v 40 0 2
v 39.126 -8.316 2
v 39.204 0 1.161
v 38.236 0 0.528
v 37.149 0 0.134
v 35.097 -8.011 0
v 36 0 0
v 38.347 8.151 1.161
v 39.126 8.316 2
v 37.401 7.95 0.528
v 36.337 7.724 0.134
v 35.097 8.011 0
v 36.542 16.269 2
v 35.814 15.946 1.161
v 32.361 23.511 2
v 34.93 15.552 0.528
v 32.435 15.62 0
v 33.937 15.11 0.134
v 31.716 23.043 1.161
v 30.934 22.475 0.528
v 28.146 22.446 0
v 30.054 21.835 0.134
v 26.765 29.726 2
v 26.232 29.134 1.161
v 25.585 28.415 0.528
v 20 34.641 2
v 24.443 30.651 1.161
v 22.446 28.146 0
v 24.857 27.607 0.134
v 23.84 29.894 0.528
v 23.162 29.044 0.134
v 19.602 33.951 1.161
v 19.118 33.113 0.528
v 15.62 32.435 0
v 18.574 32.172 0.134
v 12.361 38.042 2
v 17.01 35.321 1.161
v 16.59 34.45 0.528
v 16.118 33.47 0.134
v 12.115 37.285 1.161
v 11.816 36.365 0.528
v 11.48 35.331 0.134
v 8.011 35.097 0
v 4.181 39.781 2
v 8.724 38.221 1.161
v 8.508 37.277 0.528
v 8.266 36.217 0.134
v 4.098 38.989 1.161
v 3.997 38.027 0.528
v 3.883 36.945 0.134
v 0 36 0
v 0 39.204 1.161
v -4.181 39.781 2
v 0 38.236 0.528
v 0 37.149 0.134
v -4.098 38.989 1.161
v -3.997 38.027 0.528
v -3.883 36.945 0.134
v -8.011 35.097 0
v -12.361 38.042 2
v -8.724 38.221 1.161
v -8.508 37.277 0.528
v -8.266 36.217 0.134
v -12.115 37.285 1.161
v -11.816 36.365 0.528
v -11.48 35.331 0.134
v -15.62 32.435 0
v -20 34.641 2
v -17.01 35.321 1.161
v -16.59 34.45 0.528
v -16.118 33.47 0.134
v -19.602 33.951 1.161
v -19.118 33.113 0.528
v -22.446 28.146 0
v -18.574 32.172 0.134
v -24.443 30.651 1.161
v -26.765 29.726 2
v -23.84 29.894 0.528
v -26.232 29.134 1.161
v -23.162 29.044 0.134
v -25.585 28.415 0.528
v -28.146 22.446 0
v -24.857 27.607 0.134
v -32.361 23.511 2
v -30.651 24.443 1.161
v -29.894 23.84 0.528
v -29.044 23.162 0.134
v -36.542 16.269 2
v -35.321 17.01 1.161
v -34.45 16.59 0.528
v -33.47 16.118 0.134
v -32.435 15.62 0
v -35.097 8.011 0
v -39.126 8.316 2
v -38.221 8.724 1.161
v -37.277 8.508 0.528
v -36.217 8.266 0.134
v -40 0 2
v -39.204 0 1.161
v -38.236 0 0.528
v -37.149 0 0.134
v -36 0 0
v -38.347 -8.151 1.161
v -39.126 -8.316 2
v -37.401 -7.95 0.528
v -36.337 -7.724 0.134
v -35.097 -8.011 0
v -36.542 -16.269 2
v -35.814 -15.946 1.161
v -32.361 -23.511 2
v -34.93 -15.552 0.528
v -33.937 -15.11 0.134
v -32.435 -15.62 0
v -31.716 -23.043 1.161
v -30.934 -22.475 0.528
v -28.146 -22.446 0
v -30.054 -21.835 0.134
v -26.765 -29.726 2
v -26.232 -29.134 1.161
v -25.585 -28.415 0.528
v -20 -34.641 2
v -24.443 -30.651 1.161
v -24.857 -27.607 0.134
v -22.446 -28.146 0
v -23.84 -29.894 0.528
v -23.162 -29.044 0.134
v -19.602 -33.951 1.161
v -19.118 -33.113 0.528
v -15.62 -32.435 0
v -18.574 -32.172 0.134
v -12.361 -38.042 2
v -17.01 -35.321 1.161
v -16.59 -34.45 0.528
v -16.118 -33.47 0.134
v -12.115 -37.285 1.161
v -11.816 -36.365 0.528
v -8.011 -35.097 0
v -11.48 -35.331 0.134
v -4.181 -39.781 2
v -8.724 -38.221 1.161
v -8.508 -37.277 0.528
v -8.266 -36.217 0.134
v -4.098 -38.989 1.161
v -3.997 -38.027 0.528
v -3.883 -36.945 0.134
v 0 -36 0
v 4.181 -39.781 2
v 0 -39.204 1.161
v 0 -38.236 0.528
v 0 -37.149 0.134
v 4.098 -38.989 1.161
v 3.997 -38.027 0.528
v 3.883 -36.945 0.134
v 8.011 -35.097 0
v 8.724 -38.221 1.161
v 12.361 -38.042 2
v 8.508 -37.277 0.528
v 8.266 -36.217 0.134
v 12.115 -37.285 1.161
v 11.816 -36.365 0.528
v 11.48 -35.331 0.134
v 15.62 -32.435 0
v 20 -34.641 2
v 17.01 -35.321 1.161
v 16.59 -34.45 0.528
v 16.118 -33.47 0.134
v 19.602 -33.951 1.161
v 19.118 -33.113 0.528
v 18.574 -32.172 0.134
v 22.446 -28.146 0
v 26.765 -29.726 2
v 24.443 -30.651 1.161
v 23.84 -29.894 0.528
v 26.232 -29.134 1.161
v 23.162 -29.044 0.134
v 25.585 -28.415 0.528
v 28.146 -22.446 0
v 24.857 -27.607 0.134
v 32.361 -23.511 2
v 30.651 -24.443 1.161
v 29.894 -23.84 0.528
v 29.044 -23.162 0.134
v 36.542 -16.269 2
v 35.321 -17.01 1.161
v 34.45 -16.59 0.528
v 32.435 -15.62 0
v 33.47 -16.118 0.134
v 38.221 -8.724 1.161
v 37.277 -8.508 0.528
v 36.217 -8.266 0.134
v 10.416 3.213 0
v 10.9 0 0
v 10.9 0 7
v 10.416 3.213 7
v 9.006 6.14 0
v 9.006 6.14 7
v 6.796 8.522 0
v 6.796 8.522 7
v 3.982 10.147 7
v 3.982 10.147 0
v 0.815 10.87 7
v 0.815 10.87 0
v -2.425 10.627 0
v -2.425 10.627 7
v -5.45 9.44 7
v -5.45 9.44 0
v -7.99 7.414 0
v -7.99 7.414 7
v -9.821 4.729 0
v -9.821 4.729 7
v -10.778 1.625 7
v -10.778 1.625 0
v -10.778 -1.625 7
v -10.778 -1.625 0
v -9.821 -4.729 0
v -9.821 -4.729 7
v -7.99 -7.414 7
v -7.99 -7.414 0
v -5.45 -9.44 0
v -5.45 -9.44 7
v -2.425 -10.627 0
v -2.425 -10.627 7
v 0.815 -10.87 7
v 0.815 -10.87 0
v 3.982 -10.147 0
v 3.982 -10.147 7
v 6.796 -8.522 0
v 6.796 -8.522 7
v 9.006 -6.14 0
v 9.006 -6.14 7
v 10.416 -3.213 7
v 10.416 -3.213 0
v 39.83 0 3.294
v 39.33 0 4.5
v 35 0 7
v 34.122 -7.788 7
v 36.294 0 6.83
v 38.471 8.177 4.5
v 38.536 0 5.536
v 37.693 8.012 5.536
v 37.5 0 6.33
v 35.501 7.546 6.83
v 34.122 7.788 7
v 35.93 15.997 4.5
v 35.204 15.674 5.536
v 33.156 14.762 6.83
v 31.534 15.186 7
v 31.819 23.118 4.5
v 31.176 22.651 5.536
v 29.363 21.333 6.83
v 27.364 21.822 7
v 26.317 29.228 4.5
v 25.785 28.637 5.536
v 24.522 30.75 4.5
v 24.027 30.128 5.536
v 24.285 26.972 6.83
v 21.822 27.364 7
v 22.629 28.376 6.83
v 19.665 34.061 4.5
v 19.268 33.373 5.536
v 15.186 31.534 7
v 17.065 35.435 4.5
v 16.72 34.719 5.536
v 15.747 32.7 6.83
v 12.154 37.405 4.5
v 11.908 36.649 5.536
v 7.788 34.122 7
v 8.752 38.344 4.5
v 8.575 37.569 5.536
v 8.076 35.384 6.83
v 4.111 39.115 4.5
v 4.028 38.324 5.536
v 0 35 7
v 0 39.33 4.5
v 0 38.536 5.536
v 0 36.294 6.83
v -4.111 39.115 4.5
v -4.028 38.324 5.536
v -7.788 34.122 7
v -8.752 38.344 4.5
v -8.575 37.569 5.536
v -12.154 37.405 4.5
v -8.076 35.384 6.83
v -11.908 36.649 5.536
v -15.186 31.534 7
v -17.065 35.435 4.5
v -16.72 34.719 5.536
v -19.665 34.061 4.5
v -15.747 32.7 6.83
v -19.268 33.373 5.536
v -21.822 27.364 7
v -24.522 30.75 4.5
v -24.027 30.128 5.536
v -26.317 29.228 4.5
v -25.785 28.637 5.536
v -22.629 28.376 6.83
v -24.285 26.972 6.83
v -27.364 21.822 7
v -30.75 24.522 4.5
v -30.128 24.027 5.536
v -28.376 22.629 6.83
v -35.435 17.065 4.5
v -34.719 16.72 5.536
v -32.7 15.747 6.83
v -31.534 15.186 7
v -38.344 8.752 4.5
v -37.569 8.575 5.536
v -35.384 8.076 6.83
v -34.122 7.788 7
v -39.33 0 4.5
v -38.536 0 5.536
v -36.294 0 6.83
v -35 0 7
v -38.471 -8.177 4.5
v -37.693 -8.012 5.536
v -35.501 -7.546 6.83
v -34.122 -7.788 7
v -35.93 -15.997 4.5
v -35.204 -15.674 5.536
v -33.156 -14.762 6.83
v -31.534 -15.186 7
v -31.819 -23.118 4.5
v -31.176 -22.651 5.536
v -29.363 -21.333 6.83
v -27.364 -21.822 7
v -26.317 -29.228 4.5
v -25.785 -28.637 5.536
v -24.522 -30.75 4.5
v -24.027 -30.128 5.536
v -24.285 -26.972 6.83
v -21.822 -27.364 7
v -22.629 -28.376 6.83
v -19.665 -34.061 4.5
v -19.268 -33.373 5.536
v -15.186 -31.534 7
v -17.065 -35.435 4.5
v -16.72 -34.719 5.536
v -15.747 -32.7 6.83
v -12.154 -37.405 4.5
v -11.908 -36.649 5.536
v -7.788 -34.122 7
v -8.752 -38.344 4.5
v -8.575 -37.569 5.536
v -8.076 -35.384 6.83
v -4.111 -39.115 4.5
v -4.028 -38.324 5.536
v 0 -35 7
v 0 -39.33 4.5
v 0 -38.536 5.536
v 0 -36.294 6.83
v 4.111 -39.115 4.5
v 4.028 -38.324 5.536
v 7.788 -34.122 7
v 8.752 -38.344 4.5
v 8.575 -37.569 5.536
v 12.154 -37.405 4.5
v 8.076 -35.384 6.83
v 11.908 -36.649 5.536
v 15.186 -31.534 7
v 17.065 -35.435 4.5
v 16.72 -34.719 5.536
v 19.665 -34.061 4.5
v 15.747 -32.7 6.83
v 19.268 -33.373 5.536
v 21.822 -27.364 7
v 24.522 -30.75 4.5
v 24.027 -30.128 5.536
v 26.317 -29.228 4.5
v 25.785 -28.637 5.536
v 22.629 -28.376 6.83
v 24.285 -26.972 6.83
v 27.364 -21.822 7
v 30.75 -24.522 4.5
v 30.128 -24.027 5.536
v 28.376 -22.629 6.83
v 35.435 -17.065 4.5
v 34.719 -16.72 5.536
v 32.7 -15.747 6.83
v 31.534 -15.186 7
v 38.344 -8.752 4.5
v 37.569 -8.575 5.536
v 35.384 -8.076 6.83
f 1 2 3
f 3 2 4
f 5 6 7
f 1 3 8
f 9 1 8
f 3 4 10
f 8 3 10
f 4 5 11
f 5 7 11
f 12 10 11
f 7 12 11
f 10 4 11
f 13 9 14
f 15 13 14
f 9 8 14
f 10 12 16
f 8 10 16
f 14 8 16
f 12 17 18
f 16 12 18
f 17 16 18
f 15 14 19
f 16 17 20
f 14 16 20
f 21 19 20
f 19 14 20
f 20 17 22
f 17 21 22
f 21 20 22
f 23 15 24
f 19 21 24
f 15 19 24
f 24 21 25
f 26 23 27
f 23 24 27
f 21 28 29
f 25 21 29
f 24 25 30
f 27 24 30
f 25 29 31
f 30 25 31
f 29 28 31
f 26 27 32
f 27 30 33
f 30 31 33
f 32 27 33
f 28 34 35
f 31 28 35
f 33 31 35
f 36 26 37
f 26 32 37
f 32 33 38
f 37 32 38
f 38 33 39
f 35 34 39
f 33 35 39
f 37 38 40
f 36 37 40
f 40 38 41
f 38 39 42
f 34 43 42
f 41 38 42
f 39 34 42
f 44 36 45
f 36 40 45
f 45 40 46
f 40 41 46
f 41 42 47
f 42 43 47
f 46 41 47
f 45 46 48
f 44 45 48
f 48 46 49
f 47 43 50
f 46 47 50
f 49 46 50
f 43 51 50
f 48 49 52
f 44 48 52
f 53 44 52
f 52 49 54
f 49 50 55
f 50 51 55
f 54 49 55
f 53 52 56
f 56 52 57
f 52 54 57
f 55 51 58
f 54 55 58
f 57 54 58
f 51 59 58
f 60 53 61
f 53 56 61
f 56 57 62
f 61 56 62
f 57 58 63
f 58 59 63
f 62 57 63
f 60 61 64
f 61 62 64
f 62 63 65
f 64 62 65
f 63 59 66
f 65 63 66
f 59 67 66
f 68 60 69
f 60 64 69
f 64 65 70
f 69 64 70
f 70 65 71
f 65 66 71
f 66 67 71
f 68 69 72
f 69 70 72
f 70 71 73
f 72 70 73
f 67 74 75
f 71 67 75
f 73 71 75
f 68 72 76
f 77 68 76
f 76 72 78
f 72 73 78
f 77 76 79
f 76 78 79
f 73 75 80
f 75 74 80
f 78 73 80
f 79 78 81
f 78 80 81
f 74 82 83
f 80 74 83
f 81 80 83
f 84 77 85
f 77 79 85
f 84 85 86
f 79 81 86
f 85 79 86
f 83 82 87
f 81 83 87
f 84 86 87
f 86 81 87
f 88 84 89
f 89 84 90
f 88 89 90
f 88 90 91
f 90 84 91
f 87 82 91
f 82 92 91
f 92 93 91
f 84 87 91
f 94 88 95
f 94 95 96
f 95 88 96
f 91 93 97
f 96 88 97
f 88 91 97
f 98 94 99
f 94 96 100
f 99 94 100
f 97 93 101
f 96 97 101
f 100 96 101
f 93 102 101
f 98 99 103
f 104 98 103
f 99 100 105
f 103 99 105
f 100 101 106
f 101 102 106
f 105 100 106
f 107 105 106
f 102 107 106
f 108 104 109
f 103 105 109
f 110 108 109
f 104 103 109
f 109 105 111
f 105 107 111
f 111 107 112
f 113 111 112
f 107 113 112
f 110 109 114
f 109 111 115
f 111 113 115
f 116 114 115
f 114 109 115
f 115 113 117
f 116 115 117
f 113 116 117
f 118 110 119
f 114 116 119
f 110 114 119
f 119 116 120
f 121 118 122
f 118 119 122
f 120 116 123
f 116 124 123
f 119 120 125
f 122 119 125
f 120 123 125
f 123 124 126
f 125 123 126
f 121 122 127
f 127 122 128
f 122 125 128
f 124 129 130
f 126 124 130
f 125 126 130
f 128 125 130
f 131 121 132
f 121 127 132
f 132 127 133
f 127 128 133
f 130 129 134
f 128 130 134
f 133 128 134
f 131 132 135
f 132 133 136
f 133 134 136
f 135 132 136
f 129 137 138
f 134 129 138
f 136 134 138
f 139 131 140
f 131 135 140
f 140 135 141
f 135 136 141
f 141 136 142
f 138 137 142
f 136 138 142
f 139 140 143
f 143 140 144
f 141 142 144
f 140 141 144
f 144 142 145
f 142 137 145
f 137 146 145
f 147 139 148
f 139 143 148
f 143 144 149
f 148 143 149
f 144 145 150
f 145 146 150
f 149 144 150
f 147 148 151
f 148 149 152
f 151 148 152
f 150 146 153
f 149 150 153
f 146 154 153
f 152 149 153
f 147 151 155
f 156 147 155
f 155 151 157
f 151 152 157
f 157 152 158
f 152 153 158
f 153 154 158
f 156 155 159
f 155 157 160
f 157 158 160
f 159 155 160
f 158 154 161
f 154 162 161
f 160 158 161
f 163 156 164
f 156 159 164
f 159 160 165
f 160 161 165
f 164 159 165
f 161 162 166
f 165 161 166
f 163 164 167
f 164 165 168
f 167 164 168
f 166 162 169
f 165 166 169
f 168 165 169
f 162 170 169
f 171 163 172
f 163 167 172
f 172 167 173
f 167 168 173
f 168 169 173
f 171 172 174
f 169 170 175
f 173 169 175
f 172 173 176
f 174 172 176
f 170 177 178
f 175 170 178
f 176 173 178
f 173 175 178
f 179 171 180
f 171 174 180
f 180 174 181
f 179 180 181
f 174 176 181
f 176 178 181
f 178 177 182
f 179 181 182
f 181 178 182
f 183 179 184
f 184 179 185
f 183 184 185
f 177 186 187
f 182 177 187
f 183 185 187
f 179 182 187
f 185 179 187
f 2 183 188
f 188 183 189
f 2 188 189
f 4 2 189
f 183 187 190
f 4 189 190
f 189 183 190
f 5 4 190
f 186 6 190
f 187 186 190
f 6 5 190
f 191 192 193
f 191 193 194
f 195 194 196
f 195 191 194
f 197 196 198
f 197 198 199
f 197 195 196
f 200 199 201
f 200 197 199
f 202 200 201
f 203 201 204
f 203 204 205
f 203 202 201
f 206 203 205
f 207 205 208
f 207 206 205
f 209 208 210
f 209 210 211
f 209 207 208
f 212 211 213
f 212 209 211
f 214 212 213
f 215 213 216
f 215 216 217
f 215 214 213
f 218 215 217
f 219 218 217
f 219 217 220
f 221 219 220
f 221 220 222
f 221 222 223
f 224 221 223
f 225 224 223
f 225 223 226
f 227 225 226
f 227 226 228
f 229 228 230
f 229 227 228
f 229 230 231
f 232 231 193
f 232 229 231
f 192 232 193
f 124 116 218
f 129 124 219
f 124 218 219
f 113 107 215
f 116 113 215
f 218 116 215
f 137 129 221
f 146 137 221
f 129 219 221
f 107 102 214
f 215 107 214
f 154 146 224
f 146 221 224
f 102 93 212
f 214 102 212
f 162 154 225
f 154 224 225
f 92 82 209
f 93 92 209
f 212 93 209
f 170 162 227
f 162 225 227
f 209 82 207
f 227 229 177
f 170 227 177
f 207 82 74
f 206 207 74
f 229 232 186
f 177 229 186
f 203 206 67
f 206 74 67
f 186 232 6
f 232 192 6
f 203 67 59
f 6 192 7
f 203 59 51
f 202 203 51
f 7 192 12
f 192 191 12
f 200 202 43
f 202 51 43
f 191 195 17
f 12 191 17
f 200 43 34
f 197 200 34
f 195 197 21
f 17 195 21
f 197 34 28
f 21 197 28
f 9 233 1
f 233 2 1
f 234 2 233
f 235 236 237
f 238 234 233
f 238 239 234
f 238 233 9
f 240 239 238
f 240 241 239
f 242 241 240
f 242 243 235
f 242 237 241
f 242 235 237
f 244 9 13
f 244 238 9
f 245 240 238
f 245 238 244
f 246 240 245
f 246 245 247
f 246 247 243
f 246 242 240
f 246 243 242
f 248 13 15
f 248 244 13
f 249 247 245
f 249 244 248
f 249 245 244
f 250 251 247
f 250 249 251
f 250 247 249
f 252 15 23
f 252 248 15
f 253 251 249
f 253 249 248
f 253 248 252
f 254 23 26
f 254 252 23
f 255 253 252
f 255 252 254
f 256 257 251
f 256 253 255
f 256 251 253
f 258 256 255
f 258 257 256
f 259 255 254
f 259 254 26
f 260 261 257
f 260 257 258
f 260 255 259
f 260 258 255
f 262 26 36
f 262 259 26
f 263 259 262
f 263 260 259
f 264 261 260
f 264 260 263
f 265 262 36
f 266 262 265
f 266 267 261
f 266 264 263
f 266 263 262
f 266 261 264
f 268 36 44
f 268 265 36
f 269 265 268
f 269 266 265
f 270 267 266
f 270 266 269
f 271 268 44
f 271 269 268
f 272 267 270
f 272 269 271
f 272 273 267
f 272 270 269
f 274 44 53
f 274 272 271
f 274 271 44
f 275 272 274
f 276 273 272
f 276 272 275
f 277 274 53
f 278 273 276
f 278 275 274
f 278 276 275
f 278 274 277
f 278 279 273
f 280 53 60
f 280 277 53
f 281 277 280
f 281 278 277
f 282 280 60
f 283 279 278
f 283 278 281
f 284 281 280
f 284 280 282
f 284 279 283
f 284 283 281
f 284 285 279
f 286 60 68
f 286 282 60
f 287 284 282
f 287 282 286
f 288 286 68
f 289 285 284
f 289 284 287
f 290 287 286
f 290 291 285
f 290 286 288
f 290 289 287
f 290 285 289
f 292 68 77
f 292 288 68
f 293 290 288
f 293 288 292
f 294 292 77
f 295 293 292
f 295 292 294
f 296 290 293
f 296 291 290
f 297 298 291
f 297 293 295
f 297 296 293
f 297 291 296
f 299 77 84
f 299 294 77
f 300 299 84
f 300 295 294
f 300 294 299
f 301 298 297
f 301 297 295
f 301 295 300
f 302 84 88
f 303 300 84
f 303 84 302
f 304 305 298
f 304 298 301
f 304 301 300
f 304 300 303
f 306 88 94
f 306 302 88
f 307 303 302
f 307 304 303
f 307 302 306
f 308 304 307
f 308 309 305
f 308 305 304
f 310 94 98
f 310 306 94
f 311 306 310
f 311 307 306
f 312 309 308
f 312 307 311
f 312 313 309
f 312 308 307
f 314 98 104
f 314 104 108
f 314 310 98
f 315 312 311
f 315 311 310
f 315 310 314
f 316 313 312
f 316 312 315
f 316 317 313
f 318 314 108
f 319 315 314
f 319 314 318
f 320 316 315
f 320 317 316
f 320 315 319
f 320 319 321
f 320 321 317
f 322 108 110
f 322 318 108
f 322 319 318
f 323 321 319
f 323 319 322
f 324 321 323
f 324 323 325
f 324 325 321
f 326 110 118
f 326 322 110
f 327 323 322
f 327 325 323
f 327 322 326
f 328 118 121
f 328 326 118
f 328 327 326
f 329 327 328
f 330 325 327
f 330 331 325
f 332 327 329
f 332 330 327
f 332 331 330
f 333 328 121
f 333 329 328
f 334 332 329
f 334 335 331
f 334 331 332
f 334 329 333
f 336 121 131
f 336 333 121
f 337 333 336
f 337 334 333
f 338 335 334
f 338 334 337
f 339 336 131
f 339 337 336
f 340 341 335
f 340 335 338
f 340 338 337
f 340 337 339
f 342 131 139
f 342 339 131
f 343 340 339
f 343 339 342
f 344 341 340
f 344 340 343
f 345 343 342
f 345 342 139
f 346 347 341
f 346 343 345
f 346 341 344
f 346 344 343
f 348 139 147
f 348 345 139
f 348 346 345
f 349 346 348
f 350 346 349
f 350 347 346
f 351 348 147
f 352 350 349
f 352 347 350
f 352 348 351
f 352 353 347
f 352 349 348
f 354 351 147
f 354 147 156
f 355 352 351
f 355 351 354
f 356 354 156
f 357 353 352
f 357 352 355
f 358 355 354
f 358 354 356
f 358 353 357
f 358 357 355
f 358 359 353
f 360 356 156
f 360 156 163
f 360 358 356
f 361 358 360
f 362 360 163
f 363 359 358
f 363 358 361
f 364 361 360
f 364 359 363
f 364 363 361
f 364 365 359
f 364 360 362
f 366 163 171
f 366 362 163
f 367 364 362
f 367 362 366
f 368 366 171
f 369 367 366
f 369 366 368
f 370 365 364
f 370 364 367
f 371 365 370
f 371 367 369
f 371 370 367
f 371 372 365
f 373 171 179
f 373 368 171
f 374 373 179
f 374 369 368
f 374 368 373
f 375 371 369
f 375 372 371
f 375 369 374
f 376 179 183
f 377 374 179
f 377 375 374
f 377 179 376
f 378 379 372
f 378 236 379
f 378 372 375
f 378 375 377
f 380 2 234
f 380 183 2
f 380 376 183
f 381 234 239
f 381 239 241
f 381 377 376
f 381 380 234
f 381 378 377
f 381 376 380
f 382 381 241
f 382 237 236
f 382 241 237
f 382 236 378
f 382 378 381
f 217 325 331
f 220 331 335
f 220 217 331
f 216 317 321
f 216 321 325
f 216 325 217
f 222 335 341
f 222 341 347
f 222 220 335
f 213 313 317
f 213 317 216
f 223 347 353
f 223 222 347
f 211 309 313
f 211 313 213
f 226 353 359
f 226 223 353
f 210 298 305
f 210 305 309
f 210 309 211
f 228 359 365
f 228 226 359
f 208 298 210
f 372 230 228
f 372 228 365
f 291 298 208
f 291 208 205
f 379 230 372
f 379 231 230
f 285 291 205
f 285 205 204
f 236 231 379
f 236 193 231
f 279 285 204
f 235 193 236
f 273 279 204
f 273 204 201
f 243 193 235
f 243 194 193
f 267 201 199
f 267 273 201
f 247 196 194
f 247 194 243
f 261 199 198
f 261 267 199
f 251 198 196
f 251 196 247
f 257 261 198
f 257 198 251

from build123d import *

# Parameters (mm, degrees)
F0_R     = 40
F0_R_2   = 10.9
F1_DEPTH = 7
F2_R     = 5


# Not quite as in the source:
# - a fillet or chamfer that OpenCascade refuses, or shapes differently, is made with other operations: its cross-section is extruded or revolved along the edge and cut away or added


with BuildPart() as f1:
    # F0 (on Top) → F1 (new body)
    with BuildSketch(Plane.XY):
        Circle(F0_R)
        Circle(F0_R_2, mode=Mode.SUBTRACT)
    extrude(amount=F1_DEPTH)

    # F2
    f2_edges = [f1.edges().sort_by_distance(p)[0] for p in [
        (-40, 0, 7),
    ]]
    fillet(f2_edges, radius=F2_R)

    # F3: fillet of radius 5 on 1 edges, made by hand

    # F3_s1 → F3_t2 (revolve, cut)
    with BuildSketch(Plane.XZ):
        with BuildLine():
            ThreePointArc((40, 2), (38.2360679775, 0.527864045), (36, 0))
            Line((36, 0), (40, 0))
            Line((40, 0), (40, 2))
        make_face()
    revolve(axis=Axis((0, 0, 0), (0, 0, 1)), mode=Mode.SUBTRACT)


solid = f1.part
